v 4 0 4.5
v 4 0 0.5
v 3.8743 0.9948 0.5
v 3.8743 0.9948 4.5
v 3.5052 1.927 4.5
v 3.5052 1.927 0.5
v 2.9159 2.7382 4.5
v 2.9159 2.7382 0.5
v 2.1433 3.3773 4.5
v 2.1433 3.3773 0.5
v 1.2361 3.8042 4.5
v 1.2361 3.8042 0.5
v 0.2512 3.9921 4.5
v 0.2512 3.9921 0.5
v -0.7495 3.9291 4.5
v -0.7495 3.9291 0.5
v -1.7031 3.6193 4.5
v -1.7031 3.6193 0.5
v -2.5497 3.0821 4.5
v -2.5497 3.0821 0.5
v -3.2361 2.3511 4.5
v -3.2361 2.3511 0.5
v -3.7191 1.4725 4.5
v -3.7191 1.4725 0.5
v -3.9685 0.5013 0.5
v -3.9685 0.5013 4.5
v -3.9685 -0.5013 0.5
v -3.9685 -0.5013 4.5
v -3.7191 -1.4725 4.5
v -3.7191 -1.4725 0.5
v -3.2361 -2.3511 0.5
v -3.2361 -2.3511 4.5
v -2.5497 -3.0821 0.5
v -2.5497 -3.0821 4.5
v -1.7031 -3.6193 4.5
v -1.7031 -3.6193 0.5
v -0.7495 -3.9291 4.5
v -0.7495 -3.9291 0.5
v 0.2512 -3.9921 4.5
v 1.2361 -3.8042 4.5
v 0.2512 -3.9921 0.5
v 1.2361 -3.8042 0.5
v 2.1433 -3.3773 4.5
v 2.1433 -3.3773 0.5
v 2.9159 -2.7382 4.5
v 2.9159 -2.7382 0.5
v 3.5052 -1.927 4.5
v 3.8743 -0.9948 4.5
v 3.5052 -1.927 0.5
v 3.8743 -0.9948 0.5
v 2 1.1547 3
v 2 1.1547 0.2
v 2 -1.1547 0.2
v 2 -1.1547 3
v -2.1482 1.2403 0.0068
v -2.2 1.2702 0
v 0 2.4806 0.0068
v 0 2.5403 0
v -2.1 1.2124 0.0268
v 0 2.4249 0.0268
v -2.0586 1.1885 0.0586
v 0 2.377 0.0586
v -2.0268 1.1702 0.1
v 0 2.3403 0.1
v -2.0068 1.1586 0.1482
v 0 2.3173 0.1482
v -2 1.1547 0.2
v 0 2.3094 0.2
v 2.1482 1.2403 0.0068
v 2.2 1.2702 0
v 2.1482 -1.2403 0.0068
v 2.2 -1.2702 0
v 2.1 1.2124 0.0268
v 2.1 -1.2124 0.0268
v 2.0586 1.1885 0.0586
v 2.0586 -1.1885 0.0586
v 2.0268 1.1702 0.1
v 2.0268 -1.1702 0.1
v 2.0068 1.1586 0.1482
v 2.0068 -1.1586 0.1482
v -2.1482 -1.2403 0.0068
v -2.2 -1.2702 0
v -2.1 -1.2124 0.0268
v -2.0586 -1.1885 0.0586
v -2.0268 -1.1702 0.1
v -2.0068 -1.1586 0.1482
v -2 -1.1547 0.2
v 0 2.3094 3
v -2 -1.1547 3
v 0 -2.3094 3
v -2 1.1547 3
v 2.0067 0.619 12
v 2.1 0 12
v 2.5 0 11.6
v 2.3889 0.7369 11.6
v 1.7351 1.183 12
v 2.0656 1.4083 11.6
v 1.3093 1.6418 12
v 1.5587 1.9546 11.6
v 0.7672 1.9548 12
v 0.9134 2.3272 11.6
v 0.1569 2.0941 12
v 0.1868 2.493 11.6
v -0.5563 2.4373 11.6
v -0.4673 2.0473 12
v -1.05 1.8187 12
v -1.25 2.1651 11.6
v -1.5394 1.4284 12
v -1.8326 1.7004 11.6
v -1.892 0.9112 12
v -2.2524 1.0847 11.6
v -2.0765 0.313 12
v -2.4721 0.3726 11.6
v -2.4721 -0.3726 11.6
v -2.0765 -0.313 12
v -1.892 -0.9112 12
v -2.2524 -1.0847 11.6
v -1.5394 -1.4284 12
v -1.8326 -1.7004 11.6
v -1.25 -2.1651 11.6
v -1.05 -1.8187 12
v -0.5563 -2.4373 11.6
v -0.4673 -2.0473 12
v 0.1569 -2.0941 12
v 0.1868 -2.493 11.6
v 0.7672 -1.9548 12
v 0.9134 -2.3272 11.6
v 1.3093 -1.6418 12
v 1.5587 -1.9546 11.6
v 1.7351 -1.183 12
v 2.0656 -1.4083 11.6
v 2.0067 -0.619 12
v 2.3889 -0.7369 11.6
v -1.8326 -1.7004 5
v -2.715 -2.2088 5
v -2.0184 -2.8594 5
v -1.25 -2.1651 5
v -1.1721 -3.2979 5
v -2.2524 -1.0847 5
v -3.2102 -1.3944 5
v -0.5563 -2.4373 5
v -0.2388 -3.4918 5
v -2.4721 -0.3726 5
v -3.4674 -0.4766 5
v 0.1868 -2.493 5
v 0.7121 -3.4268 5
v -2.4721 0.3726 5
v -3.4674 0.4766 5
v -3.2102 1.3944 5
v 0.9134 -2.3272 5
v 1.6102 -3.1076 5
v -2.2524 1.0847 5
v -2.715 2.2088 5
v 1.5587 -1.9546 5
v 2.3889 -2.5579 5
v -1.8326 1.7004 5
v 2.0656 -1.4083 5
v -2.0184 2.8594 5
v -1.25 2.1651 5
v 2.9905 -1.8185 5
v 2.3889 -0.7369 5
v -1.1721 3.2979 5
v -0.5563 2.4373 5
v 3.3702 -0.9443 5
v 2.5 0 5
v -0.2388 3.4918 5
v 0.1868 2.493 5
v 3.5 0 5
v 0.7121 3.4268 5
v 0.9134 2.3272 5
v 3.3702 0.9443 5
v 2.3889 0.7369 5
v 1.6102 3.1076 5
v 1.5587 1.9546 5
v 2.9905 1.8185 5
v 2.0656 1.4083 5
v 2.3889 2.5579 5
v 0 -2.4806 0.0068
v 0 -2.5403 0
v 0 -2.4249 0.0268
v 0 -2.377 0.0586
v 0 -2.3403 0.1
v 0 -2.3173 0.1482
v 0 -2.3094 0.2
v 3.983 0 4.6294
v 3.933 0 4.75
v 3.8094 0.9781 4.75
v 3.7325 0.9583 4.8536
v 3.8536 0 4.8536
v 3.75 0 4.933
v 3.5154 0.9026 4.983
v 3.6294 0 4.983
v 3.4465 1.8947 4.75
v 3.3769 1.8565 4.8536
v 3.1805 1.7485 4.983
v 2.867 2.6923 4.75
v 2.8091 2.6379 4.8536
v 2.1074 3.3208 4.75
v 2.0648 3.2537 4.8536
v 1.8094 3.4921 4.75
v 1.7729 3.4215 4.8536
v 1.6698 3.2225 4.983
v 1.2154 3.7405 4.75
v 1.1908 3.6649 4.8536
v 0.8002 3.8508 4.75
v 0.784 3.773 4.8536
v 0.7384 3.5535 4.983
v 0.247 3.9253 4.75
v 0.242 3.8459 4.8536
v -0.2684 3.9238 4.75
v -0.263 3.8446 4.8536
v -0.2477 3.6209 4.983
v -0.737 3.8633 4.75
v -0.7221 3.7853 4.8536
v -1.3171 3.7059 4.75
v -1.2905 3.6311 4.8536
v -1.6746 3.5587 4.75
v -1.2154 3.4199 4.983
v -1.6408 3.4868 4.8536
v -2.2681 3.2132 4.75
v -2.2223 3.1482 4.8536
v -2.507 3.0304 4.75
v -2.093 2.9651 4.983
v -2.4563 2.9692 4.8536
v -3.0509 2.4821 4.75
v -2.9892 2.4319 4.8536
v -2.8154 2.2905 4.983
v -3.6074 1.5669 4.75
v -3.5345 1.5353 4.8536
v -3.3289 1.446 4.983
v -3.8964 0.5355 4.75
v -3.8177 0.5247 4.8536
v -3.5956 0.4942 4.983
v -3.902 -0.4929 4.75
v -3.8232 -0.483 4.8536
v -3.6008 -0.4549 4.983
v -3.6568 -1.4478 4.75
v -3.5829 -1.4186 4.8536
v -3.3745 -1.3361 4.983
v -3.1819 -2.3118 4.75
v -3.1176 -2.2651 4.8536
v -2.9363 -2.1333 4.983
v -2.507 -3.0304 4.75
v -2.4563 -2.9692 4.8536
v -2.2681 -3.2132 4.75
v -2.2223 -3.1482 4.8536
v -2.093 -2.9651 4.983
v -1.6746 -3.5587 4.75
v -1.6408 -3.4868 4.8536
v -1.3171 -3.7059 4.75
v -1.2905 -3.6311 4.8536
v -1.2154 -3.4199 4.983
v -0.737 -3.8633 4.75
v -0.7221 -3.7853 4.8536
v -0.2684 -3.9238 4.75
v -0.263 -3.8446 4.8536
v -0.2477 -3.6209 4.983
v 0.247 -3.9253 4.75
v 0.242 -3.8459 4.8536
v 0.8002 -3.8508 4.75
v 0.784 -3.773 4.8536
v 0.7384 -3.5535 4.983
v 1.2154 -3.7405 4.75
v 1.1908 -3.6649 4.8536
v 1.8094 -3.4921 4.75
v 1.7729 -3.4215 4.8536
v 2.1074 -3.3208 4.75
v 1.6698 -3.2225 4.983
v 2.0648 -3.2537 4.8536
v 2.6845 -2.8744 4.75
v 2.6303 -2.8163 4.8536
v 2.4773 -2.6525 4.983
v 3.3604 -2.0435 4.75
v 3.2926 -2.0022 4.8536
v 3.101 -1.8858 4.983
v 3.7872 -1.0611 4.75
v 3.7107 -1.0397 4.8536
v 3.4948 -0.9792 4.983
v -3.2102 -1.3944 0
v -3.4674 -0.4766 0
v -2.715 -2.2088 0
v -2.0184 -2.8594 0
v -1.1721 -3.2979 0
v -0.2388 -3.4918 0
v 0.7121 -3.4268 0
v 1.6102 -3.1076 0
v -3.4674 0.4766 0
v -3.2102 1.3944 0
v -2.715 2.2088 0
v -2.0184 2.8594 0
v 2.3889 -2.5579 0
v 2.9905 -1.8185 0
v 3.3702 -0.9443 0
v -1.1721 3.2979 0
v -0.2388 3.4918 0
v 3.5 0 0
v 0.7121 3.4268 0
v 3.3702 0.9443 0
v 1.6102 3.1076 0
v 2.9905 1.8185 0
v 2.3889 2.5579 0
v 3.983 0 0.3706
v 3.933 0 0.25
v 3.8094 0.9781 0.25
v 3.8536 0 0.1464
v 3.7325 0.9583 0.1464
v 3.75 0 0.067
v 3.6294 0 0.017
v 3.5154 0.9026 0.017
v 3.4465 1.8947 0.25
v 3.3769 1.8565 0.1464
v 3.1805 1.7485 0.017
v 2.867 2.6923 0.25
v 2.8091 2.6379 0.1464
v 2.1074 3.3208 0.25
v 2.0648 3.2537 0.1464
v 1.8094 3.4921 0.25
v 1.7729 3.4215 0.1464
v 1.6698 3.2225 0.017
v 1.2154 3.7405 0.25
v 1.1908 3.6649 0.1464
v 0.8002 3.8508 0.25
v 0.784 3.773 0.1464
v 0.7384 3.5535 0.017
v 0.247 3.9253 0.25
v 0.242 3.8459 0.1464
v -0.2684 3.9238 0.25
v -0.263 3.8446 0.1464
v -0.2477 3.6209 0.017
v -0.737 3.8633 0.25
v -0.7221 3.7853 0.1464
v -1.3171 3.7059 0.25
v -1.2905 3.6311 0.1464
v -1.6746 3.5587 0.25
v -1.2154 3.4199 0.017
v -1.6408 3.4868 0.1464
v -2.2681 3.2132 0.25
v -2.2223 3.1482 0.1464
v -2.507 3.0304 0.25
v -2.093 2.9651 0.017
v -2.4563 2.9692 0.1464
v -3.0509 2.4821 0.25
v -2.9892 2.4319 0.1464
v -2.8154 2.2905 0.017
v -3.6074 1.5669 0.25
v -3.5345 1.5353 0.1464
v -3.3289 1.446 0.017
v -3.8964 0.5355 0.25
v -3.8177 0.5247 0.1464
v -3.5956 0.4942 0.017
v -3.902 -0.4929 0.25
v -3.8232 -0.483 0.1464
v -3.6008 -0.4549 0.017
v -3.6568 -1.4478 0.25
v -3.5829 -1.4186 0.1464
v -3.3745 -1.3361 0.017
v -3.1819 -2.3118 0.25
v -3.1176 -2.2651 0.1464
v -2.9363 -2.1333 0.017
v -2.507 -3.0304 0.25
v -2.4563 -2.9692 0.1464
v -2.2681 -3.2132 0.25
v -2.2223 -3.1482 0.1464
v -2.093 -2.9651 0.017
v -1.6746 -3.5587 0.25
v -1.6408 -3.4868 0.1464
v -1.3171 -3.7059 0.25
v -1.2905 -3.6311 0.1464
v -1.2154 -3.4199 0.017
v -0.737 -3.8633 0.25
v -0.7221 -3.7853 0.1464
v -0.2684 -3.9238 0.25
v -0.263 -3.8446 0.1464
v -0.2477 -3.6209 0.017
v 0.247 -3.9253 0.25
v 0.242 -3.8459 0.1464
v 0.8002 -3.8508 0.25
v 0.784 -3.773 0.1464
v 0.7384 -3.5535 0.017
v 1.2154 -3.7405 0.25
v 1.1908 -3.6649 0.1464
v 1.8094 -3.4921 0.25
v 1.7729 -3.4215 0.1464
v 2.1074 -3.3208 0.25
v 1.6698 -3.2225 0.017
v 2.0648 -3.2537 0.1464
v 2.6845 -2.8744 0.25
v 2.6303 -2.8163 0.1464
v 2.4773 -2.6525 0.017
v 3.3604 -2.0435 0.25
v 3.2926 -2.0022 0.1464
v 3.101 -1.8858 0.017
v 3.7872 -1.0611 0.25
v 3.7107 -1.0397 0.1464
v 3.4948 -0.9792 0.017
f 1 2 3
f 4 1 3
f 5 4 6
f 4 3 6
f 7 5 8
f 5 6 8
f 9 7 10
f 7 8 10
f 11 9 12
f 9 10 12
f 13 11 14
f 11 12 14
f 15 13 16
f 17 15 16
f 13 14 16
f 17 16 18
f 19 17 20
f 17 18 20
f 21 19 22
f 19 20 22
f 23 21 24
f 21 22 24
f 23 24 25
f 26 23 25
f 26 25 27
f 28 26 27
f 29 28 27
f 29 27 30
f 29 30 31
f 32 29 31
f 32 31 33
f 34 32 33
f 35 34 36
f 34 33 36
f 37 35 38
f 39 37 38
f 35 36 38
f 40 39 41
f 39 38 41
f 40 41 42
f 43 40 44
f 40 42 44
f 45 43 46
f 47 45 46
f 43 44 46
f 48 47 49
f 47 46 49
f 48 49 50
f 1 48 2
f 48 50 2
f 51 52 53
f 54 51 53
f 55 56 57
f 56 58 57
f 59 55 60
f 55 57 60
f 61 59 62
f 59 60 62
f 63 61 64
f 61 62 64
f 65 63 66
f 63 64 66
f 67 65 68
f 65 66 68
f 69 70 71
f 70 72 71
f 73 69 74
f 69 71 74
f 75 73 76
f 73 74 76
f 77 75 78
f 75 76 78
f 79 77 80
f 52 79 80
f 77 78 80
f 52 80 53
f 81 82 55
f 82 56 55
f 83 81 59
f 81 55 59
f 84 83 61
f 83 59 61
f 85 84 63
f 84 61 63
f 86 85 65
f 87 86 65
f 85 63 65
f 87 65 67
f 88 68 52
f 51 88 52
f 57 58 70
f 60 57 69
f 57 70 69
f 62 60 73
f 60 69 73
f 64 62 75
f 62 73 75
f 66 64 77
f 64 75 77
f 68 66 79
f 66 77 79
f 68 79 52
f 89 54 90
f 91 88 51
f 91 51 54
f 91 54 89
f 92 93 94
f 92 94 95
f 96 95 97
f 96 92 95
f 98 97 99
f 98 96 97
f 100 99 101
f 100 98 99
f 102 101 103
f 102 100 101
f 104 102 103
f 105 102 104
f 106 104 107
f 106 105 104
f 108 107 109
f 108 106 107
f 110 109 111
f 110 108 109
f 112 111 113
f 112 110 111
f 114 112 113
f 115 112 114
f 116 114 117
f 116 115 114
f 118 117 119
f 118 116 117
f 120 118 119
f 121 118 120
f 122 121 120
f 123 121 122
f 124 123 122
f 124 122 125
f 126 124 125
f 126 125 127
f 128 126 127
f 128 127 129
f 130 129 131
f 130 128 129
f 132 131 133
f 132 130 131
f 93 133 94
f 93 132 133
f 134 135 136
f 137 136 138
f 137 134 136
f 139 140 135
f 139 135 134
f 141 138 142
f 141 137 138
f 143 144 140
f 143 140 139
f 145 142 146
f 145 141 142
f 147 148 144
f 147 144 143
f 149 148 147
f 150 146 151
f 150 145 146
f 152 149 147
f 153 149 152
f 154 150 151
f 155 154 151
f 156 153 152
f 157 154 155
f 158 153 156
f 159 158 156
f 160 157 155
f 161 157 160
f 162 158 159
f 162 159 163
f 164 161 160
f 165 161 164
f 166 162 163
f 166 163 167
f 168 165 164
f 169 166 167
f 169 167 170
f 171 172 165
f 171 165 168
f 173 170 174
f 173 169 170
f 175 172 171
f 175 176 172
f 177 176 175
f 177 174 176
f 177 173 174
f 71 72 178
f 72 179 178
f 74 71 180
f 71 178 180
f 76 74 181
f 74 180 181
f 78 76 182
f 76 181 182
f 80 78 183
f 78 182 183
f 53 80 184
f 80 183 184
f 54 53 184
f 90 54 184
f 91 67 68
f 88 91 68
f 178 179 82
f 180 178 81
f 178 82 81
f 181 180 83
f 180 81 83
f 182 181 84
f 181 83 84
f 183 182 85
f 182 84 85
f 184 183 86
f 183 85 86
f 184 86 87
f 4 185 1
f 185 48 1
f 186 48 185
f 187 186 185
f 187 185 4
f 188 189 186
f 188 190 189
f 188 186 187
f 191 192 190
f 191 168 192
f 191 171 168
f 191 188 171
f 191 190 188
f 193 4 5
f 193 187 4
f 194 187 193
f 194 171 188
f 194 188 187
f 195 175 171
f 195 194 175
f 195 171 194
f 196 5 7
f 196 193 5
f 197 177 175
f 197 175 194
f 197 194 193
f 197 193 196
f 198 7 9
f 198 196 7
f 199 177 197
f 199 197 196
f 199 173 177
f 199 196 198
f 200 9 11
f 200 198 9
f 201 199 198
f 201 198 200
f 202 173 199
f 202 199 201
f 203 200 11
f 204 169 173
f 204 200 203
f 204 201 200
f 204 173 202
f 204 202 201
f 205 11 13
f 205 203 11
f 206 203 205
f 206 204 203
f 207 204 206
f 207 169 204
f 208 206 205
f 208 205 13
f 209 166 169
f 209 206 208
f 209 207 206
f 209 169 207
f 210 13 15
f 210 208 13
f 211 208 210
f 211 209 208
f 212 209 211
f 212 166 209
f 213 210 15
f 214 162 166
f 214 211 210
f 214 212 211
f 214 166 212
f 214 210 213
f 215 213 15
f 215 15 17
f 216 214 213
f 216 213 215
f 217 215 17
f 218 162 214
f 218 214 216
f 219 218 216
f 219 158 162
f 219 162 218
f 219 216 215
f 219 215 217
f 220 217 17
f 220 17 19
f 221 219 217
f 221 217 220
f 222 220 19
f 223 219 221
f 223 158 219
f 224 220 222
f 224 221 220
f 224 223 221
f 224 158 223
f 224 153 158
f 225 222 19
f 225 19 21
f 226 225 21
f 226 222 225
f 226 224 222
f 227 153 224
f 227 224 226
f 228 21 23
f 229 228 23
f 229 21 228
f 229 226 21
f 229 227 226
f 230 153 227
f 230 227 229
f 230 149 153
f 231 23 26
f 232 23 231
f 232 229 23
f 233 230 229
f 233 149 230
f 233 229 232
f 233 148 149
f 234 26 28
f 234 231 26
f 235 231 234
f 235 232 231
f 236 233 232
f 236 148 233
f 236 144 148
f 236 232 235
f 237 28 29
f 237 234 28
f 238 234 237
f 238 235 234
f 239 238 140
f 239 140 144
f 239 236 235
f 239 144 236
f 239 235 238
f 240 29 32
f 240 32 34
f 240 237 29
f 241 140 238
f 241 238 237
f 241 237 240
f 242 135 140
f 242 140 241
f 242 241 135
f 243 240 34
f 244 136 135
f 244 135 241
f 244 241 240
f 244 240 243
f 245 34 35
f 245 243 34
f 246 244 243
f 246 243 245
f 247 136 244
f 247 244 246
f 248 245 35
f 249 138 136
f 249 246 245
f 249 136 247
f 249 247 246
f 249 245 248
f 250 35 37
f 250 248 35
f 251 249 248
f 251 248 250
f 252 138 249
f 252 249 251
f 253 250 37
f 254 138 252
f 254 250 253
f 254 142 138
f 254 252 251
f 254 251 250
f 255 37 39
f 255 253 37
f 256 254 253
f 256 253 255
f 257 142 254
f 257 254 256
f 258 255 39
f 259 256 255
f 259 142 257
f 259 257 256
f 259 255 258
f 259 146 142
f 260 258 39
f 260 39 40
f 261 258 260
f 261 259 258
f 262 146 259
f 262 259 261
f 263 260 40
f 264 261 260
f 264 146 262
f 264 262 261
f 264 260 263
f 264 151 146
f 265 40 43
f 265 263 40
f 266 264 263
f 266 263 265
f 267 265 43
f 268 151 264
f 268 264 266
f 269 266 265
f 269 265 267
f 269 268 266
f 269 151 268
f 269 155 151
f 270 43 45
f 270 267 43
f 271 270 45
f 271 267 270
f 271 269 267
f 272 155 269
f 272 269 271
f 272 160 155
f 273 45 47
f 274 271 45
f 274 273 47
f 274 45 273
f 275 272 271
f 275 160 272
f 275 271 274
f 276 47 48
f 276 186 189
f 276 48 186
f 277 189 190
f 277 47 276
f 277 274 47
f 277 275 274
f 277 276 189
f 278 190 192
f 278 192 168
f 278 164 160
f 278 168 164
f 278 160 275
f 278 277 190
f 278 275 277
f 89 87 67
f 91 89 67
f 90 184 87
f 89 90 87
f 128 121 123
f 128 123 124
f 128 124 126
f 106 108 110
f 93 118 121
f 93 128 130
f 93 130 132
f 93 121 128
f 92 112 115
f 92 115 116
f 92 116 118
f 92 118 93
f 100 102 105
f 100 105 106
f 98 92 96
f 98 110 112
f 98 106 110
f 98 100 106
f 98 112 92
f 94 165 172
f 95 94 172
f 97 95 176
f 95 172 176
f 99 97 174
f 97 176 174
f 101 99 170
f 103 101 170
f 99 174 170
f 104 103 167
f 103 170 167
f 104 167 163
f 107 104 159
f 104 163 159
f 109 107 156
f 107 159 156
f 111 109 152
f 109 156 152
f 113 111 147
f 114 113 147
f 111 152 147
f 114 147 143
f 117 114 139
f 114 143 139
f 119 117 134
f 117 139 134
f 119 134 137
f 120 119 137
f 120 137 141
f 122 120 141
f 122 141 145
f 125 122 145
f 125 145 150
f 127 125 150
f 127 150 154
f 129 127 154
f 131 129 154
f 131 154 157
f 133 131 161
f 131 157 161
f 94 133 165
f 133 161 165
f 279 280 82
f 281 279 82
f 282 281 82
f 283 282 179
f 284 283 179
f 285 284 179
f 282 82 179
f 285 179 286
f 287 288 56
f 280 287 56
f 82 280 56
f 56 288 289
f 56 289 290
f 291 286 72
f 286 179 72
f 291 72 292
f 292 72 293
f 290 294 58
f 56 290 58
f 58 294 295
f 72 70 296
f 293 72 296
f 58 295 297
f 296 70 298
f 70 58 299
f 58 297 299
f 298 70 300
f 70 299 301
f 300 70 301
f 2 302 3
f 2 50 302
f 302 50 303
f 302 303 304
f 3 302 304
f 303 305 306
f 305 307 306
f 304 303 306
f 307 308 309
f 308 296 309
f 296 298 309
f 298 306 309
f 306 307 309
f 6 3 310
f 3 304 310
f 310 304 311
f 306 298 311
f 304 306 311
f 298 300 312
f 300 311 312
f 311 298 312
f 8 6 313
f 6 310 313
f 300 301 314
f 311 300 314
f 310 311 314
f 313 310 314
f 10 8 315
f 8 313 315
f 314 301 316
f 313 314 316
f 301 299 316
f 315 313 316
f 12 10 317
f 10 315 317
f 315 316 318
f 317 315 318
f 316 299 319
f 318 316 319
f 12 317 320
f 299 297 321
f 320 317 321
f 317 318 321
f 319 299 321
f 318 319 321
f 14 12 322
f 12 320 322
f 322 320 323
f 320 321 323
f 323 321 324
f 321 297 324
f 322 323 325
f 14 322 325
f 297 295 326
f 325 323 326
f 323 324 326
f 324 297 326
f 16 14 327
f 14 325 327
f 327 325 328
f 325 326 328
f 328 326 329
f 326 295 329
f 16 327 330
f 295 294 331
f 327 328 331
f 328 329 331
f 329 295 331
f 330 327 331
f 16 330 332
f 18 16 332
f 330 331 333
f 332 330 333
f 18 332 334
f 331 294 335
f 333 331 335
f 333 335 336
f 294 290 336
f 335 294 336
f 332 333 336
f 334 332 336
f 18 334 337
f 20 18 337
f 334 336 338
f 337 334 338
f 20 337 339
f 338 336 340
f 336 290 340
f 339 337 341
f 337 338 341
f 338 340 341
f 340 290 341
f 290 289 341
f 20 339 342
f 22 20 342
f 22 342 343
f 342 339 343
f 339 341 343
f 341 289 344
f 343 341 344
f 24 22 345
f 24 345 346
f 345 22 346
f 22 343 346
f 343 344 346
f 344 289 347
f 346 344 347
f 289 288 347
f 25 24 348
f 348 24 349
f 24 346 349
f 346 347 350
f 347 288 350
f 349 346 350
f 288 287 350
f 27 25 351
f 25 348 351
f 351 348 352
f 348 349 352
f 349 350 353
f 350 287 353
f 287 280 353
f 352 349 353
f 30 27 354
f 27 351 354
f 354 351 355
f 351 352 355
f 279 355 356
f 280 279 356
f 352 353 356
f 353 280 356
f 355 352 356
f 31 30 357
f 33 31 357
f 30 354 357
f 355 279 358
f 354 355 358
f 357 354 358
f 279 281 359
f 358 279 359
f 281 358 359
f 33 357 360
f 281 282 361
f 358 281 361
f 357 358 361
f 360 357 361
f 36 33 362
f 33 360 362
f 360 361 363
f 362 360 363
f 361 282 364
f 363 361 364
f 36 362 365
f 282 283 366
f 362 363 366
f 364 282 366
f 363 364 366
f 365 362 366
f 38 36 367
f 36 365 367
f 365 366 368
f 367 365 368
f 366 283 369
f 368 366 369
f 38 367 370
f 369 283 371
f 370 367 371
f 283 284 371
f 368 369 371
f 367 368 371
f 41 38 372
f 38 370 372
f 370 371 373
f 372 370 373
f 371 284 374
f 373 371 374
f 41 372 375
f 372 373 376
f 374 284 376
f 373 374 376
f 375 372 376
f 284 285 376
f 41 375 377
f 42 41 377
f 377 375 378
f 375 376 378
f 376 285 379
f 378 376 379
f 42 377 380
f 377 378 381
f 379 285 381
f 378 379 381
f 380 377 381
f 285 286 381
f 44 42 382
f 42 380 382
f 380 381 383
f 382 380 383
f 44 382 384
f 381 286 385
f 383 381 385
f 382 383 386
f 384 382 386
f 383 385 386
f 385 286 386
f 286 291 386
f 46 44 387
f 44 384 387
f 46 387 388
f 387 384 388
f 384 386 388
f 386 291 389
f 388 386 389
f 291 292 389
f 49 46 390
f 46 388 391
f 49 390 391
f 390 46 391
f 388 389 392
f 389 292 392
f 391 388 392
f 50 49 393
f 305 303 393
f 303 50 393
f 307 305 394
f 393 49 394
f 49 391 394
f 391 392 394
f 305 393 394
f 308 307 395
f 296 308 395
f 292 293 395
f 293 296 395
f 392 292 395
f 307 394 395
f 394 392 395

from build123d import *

# Parameters (mm, degrees)
ESBO_O1_R                = 4
RESSALTO_EXTRUS_O1_DEPTH = 5
ESBO_O2_R                = 2.5
RESSALTO_EXTRUS_O2_DEPTH = 7
CORTE_EXTRUS_O1_DEPTH    = 3
FILETE1_R                = 0.5
FILETE2_R                = 0.2
CHANFRO2_SIZE            = 0.4


with BuildPart() as part:
    # Esboço1 → Ressalto-extrusão1 (new body)
    with BuildSketch(Plane.XY):
        Circle(ESBO_O1_R)
    extrude(amount=RESSALTO_EXTRUS_O1_DEPTH)

    # Esboço2 → Ressalto-extrusão2 (add)
    with BuildSketch(Plane.XY.offset(5)):
        Circle(ESBO_O2_R)
    extrude(amount=RESSALTO_EXTRUS_O2_DEPTH)

    # Esboço3 → Corte-extrusão1 (cut)
    with BuildSketch(Plane(origin=(0, 0, 0), x_dir=(-1, 0, 0), z_dir=(0, 0, -1))):
        Polygon((0, 2.309401077), (-2, 1.154700538), (-2, -1.154700538), (0, -2.309401077), (2, -1.154700538), (2, 1.154700538), align=None)
    extrude(amount=-CORTE_EXTRUS_O1_DEPTH, mode=Mode.SUBTRACT)

    # Filete1
    filete1_edges = [part.edges().sort_by_distance(p)[0] for p in [
        (-4, 0, 0),
        (-4, 0, 5),
    ]]
    fillet(filete1_edges, radius=FILETE1_R)

    # Filete2
    filete2_edges = [part.edges().sort_by_distance(p)[0] for p in [
        (-1, 1.732050808, 0),
        (1, 1.732050808, 0),
        (2, 0, 0),
        (1, -1.732050808, 0),
        (-1, -1.732050808, 0),
        (-2, 0, 0),
    ]]
    fillet(filete2_edges, radius=FILETE2_R)

    # Chanfro2
    chanfro2_edges = [part.edges().sort_by_distance(p)[0] for p in [
        (-2.5, 0, 12),
    ]]
    chamfer(chanfro2_edges, length=CHANFRO2_SIZE)


solid = part.part
